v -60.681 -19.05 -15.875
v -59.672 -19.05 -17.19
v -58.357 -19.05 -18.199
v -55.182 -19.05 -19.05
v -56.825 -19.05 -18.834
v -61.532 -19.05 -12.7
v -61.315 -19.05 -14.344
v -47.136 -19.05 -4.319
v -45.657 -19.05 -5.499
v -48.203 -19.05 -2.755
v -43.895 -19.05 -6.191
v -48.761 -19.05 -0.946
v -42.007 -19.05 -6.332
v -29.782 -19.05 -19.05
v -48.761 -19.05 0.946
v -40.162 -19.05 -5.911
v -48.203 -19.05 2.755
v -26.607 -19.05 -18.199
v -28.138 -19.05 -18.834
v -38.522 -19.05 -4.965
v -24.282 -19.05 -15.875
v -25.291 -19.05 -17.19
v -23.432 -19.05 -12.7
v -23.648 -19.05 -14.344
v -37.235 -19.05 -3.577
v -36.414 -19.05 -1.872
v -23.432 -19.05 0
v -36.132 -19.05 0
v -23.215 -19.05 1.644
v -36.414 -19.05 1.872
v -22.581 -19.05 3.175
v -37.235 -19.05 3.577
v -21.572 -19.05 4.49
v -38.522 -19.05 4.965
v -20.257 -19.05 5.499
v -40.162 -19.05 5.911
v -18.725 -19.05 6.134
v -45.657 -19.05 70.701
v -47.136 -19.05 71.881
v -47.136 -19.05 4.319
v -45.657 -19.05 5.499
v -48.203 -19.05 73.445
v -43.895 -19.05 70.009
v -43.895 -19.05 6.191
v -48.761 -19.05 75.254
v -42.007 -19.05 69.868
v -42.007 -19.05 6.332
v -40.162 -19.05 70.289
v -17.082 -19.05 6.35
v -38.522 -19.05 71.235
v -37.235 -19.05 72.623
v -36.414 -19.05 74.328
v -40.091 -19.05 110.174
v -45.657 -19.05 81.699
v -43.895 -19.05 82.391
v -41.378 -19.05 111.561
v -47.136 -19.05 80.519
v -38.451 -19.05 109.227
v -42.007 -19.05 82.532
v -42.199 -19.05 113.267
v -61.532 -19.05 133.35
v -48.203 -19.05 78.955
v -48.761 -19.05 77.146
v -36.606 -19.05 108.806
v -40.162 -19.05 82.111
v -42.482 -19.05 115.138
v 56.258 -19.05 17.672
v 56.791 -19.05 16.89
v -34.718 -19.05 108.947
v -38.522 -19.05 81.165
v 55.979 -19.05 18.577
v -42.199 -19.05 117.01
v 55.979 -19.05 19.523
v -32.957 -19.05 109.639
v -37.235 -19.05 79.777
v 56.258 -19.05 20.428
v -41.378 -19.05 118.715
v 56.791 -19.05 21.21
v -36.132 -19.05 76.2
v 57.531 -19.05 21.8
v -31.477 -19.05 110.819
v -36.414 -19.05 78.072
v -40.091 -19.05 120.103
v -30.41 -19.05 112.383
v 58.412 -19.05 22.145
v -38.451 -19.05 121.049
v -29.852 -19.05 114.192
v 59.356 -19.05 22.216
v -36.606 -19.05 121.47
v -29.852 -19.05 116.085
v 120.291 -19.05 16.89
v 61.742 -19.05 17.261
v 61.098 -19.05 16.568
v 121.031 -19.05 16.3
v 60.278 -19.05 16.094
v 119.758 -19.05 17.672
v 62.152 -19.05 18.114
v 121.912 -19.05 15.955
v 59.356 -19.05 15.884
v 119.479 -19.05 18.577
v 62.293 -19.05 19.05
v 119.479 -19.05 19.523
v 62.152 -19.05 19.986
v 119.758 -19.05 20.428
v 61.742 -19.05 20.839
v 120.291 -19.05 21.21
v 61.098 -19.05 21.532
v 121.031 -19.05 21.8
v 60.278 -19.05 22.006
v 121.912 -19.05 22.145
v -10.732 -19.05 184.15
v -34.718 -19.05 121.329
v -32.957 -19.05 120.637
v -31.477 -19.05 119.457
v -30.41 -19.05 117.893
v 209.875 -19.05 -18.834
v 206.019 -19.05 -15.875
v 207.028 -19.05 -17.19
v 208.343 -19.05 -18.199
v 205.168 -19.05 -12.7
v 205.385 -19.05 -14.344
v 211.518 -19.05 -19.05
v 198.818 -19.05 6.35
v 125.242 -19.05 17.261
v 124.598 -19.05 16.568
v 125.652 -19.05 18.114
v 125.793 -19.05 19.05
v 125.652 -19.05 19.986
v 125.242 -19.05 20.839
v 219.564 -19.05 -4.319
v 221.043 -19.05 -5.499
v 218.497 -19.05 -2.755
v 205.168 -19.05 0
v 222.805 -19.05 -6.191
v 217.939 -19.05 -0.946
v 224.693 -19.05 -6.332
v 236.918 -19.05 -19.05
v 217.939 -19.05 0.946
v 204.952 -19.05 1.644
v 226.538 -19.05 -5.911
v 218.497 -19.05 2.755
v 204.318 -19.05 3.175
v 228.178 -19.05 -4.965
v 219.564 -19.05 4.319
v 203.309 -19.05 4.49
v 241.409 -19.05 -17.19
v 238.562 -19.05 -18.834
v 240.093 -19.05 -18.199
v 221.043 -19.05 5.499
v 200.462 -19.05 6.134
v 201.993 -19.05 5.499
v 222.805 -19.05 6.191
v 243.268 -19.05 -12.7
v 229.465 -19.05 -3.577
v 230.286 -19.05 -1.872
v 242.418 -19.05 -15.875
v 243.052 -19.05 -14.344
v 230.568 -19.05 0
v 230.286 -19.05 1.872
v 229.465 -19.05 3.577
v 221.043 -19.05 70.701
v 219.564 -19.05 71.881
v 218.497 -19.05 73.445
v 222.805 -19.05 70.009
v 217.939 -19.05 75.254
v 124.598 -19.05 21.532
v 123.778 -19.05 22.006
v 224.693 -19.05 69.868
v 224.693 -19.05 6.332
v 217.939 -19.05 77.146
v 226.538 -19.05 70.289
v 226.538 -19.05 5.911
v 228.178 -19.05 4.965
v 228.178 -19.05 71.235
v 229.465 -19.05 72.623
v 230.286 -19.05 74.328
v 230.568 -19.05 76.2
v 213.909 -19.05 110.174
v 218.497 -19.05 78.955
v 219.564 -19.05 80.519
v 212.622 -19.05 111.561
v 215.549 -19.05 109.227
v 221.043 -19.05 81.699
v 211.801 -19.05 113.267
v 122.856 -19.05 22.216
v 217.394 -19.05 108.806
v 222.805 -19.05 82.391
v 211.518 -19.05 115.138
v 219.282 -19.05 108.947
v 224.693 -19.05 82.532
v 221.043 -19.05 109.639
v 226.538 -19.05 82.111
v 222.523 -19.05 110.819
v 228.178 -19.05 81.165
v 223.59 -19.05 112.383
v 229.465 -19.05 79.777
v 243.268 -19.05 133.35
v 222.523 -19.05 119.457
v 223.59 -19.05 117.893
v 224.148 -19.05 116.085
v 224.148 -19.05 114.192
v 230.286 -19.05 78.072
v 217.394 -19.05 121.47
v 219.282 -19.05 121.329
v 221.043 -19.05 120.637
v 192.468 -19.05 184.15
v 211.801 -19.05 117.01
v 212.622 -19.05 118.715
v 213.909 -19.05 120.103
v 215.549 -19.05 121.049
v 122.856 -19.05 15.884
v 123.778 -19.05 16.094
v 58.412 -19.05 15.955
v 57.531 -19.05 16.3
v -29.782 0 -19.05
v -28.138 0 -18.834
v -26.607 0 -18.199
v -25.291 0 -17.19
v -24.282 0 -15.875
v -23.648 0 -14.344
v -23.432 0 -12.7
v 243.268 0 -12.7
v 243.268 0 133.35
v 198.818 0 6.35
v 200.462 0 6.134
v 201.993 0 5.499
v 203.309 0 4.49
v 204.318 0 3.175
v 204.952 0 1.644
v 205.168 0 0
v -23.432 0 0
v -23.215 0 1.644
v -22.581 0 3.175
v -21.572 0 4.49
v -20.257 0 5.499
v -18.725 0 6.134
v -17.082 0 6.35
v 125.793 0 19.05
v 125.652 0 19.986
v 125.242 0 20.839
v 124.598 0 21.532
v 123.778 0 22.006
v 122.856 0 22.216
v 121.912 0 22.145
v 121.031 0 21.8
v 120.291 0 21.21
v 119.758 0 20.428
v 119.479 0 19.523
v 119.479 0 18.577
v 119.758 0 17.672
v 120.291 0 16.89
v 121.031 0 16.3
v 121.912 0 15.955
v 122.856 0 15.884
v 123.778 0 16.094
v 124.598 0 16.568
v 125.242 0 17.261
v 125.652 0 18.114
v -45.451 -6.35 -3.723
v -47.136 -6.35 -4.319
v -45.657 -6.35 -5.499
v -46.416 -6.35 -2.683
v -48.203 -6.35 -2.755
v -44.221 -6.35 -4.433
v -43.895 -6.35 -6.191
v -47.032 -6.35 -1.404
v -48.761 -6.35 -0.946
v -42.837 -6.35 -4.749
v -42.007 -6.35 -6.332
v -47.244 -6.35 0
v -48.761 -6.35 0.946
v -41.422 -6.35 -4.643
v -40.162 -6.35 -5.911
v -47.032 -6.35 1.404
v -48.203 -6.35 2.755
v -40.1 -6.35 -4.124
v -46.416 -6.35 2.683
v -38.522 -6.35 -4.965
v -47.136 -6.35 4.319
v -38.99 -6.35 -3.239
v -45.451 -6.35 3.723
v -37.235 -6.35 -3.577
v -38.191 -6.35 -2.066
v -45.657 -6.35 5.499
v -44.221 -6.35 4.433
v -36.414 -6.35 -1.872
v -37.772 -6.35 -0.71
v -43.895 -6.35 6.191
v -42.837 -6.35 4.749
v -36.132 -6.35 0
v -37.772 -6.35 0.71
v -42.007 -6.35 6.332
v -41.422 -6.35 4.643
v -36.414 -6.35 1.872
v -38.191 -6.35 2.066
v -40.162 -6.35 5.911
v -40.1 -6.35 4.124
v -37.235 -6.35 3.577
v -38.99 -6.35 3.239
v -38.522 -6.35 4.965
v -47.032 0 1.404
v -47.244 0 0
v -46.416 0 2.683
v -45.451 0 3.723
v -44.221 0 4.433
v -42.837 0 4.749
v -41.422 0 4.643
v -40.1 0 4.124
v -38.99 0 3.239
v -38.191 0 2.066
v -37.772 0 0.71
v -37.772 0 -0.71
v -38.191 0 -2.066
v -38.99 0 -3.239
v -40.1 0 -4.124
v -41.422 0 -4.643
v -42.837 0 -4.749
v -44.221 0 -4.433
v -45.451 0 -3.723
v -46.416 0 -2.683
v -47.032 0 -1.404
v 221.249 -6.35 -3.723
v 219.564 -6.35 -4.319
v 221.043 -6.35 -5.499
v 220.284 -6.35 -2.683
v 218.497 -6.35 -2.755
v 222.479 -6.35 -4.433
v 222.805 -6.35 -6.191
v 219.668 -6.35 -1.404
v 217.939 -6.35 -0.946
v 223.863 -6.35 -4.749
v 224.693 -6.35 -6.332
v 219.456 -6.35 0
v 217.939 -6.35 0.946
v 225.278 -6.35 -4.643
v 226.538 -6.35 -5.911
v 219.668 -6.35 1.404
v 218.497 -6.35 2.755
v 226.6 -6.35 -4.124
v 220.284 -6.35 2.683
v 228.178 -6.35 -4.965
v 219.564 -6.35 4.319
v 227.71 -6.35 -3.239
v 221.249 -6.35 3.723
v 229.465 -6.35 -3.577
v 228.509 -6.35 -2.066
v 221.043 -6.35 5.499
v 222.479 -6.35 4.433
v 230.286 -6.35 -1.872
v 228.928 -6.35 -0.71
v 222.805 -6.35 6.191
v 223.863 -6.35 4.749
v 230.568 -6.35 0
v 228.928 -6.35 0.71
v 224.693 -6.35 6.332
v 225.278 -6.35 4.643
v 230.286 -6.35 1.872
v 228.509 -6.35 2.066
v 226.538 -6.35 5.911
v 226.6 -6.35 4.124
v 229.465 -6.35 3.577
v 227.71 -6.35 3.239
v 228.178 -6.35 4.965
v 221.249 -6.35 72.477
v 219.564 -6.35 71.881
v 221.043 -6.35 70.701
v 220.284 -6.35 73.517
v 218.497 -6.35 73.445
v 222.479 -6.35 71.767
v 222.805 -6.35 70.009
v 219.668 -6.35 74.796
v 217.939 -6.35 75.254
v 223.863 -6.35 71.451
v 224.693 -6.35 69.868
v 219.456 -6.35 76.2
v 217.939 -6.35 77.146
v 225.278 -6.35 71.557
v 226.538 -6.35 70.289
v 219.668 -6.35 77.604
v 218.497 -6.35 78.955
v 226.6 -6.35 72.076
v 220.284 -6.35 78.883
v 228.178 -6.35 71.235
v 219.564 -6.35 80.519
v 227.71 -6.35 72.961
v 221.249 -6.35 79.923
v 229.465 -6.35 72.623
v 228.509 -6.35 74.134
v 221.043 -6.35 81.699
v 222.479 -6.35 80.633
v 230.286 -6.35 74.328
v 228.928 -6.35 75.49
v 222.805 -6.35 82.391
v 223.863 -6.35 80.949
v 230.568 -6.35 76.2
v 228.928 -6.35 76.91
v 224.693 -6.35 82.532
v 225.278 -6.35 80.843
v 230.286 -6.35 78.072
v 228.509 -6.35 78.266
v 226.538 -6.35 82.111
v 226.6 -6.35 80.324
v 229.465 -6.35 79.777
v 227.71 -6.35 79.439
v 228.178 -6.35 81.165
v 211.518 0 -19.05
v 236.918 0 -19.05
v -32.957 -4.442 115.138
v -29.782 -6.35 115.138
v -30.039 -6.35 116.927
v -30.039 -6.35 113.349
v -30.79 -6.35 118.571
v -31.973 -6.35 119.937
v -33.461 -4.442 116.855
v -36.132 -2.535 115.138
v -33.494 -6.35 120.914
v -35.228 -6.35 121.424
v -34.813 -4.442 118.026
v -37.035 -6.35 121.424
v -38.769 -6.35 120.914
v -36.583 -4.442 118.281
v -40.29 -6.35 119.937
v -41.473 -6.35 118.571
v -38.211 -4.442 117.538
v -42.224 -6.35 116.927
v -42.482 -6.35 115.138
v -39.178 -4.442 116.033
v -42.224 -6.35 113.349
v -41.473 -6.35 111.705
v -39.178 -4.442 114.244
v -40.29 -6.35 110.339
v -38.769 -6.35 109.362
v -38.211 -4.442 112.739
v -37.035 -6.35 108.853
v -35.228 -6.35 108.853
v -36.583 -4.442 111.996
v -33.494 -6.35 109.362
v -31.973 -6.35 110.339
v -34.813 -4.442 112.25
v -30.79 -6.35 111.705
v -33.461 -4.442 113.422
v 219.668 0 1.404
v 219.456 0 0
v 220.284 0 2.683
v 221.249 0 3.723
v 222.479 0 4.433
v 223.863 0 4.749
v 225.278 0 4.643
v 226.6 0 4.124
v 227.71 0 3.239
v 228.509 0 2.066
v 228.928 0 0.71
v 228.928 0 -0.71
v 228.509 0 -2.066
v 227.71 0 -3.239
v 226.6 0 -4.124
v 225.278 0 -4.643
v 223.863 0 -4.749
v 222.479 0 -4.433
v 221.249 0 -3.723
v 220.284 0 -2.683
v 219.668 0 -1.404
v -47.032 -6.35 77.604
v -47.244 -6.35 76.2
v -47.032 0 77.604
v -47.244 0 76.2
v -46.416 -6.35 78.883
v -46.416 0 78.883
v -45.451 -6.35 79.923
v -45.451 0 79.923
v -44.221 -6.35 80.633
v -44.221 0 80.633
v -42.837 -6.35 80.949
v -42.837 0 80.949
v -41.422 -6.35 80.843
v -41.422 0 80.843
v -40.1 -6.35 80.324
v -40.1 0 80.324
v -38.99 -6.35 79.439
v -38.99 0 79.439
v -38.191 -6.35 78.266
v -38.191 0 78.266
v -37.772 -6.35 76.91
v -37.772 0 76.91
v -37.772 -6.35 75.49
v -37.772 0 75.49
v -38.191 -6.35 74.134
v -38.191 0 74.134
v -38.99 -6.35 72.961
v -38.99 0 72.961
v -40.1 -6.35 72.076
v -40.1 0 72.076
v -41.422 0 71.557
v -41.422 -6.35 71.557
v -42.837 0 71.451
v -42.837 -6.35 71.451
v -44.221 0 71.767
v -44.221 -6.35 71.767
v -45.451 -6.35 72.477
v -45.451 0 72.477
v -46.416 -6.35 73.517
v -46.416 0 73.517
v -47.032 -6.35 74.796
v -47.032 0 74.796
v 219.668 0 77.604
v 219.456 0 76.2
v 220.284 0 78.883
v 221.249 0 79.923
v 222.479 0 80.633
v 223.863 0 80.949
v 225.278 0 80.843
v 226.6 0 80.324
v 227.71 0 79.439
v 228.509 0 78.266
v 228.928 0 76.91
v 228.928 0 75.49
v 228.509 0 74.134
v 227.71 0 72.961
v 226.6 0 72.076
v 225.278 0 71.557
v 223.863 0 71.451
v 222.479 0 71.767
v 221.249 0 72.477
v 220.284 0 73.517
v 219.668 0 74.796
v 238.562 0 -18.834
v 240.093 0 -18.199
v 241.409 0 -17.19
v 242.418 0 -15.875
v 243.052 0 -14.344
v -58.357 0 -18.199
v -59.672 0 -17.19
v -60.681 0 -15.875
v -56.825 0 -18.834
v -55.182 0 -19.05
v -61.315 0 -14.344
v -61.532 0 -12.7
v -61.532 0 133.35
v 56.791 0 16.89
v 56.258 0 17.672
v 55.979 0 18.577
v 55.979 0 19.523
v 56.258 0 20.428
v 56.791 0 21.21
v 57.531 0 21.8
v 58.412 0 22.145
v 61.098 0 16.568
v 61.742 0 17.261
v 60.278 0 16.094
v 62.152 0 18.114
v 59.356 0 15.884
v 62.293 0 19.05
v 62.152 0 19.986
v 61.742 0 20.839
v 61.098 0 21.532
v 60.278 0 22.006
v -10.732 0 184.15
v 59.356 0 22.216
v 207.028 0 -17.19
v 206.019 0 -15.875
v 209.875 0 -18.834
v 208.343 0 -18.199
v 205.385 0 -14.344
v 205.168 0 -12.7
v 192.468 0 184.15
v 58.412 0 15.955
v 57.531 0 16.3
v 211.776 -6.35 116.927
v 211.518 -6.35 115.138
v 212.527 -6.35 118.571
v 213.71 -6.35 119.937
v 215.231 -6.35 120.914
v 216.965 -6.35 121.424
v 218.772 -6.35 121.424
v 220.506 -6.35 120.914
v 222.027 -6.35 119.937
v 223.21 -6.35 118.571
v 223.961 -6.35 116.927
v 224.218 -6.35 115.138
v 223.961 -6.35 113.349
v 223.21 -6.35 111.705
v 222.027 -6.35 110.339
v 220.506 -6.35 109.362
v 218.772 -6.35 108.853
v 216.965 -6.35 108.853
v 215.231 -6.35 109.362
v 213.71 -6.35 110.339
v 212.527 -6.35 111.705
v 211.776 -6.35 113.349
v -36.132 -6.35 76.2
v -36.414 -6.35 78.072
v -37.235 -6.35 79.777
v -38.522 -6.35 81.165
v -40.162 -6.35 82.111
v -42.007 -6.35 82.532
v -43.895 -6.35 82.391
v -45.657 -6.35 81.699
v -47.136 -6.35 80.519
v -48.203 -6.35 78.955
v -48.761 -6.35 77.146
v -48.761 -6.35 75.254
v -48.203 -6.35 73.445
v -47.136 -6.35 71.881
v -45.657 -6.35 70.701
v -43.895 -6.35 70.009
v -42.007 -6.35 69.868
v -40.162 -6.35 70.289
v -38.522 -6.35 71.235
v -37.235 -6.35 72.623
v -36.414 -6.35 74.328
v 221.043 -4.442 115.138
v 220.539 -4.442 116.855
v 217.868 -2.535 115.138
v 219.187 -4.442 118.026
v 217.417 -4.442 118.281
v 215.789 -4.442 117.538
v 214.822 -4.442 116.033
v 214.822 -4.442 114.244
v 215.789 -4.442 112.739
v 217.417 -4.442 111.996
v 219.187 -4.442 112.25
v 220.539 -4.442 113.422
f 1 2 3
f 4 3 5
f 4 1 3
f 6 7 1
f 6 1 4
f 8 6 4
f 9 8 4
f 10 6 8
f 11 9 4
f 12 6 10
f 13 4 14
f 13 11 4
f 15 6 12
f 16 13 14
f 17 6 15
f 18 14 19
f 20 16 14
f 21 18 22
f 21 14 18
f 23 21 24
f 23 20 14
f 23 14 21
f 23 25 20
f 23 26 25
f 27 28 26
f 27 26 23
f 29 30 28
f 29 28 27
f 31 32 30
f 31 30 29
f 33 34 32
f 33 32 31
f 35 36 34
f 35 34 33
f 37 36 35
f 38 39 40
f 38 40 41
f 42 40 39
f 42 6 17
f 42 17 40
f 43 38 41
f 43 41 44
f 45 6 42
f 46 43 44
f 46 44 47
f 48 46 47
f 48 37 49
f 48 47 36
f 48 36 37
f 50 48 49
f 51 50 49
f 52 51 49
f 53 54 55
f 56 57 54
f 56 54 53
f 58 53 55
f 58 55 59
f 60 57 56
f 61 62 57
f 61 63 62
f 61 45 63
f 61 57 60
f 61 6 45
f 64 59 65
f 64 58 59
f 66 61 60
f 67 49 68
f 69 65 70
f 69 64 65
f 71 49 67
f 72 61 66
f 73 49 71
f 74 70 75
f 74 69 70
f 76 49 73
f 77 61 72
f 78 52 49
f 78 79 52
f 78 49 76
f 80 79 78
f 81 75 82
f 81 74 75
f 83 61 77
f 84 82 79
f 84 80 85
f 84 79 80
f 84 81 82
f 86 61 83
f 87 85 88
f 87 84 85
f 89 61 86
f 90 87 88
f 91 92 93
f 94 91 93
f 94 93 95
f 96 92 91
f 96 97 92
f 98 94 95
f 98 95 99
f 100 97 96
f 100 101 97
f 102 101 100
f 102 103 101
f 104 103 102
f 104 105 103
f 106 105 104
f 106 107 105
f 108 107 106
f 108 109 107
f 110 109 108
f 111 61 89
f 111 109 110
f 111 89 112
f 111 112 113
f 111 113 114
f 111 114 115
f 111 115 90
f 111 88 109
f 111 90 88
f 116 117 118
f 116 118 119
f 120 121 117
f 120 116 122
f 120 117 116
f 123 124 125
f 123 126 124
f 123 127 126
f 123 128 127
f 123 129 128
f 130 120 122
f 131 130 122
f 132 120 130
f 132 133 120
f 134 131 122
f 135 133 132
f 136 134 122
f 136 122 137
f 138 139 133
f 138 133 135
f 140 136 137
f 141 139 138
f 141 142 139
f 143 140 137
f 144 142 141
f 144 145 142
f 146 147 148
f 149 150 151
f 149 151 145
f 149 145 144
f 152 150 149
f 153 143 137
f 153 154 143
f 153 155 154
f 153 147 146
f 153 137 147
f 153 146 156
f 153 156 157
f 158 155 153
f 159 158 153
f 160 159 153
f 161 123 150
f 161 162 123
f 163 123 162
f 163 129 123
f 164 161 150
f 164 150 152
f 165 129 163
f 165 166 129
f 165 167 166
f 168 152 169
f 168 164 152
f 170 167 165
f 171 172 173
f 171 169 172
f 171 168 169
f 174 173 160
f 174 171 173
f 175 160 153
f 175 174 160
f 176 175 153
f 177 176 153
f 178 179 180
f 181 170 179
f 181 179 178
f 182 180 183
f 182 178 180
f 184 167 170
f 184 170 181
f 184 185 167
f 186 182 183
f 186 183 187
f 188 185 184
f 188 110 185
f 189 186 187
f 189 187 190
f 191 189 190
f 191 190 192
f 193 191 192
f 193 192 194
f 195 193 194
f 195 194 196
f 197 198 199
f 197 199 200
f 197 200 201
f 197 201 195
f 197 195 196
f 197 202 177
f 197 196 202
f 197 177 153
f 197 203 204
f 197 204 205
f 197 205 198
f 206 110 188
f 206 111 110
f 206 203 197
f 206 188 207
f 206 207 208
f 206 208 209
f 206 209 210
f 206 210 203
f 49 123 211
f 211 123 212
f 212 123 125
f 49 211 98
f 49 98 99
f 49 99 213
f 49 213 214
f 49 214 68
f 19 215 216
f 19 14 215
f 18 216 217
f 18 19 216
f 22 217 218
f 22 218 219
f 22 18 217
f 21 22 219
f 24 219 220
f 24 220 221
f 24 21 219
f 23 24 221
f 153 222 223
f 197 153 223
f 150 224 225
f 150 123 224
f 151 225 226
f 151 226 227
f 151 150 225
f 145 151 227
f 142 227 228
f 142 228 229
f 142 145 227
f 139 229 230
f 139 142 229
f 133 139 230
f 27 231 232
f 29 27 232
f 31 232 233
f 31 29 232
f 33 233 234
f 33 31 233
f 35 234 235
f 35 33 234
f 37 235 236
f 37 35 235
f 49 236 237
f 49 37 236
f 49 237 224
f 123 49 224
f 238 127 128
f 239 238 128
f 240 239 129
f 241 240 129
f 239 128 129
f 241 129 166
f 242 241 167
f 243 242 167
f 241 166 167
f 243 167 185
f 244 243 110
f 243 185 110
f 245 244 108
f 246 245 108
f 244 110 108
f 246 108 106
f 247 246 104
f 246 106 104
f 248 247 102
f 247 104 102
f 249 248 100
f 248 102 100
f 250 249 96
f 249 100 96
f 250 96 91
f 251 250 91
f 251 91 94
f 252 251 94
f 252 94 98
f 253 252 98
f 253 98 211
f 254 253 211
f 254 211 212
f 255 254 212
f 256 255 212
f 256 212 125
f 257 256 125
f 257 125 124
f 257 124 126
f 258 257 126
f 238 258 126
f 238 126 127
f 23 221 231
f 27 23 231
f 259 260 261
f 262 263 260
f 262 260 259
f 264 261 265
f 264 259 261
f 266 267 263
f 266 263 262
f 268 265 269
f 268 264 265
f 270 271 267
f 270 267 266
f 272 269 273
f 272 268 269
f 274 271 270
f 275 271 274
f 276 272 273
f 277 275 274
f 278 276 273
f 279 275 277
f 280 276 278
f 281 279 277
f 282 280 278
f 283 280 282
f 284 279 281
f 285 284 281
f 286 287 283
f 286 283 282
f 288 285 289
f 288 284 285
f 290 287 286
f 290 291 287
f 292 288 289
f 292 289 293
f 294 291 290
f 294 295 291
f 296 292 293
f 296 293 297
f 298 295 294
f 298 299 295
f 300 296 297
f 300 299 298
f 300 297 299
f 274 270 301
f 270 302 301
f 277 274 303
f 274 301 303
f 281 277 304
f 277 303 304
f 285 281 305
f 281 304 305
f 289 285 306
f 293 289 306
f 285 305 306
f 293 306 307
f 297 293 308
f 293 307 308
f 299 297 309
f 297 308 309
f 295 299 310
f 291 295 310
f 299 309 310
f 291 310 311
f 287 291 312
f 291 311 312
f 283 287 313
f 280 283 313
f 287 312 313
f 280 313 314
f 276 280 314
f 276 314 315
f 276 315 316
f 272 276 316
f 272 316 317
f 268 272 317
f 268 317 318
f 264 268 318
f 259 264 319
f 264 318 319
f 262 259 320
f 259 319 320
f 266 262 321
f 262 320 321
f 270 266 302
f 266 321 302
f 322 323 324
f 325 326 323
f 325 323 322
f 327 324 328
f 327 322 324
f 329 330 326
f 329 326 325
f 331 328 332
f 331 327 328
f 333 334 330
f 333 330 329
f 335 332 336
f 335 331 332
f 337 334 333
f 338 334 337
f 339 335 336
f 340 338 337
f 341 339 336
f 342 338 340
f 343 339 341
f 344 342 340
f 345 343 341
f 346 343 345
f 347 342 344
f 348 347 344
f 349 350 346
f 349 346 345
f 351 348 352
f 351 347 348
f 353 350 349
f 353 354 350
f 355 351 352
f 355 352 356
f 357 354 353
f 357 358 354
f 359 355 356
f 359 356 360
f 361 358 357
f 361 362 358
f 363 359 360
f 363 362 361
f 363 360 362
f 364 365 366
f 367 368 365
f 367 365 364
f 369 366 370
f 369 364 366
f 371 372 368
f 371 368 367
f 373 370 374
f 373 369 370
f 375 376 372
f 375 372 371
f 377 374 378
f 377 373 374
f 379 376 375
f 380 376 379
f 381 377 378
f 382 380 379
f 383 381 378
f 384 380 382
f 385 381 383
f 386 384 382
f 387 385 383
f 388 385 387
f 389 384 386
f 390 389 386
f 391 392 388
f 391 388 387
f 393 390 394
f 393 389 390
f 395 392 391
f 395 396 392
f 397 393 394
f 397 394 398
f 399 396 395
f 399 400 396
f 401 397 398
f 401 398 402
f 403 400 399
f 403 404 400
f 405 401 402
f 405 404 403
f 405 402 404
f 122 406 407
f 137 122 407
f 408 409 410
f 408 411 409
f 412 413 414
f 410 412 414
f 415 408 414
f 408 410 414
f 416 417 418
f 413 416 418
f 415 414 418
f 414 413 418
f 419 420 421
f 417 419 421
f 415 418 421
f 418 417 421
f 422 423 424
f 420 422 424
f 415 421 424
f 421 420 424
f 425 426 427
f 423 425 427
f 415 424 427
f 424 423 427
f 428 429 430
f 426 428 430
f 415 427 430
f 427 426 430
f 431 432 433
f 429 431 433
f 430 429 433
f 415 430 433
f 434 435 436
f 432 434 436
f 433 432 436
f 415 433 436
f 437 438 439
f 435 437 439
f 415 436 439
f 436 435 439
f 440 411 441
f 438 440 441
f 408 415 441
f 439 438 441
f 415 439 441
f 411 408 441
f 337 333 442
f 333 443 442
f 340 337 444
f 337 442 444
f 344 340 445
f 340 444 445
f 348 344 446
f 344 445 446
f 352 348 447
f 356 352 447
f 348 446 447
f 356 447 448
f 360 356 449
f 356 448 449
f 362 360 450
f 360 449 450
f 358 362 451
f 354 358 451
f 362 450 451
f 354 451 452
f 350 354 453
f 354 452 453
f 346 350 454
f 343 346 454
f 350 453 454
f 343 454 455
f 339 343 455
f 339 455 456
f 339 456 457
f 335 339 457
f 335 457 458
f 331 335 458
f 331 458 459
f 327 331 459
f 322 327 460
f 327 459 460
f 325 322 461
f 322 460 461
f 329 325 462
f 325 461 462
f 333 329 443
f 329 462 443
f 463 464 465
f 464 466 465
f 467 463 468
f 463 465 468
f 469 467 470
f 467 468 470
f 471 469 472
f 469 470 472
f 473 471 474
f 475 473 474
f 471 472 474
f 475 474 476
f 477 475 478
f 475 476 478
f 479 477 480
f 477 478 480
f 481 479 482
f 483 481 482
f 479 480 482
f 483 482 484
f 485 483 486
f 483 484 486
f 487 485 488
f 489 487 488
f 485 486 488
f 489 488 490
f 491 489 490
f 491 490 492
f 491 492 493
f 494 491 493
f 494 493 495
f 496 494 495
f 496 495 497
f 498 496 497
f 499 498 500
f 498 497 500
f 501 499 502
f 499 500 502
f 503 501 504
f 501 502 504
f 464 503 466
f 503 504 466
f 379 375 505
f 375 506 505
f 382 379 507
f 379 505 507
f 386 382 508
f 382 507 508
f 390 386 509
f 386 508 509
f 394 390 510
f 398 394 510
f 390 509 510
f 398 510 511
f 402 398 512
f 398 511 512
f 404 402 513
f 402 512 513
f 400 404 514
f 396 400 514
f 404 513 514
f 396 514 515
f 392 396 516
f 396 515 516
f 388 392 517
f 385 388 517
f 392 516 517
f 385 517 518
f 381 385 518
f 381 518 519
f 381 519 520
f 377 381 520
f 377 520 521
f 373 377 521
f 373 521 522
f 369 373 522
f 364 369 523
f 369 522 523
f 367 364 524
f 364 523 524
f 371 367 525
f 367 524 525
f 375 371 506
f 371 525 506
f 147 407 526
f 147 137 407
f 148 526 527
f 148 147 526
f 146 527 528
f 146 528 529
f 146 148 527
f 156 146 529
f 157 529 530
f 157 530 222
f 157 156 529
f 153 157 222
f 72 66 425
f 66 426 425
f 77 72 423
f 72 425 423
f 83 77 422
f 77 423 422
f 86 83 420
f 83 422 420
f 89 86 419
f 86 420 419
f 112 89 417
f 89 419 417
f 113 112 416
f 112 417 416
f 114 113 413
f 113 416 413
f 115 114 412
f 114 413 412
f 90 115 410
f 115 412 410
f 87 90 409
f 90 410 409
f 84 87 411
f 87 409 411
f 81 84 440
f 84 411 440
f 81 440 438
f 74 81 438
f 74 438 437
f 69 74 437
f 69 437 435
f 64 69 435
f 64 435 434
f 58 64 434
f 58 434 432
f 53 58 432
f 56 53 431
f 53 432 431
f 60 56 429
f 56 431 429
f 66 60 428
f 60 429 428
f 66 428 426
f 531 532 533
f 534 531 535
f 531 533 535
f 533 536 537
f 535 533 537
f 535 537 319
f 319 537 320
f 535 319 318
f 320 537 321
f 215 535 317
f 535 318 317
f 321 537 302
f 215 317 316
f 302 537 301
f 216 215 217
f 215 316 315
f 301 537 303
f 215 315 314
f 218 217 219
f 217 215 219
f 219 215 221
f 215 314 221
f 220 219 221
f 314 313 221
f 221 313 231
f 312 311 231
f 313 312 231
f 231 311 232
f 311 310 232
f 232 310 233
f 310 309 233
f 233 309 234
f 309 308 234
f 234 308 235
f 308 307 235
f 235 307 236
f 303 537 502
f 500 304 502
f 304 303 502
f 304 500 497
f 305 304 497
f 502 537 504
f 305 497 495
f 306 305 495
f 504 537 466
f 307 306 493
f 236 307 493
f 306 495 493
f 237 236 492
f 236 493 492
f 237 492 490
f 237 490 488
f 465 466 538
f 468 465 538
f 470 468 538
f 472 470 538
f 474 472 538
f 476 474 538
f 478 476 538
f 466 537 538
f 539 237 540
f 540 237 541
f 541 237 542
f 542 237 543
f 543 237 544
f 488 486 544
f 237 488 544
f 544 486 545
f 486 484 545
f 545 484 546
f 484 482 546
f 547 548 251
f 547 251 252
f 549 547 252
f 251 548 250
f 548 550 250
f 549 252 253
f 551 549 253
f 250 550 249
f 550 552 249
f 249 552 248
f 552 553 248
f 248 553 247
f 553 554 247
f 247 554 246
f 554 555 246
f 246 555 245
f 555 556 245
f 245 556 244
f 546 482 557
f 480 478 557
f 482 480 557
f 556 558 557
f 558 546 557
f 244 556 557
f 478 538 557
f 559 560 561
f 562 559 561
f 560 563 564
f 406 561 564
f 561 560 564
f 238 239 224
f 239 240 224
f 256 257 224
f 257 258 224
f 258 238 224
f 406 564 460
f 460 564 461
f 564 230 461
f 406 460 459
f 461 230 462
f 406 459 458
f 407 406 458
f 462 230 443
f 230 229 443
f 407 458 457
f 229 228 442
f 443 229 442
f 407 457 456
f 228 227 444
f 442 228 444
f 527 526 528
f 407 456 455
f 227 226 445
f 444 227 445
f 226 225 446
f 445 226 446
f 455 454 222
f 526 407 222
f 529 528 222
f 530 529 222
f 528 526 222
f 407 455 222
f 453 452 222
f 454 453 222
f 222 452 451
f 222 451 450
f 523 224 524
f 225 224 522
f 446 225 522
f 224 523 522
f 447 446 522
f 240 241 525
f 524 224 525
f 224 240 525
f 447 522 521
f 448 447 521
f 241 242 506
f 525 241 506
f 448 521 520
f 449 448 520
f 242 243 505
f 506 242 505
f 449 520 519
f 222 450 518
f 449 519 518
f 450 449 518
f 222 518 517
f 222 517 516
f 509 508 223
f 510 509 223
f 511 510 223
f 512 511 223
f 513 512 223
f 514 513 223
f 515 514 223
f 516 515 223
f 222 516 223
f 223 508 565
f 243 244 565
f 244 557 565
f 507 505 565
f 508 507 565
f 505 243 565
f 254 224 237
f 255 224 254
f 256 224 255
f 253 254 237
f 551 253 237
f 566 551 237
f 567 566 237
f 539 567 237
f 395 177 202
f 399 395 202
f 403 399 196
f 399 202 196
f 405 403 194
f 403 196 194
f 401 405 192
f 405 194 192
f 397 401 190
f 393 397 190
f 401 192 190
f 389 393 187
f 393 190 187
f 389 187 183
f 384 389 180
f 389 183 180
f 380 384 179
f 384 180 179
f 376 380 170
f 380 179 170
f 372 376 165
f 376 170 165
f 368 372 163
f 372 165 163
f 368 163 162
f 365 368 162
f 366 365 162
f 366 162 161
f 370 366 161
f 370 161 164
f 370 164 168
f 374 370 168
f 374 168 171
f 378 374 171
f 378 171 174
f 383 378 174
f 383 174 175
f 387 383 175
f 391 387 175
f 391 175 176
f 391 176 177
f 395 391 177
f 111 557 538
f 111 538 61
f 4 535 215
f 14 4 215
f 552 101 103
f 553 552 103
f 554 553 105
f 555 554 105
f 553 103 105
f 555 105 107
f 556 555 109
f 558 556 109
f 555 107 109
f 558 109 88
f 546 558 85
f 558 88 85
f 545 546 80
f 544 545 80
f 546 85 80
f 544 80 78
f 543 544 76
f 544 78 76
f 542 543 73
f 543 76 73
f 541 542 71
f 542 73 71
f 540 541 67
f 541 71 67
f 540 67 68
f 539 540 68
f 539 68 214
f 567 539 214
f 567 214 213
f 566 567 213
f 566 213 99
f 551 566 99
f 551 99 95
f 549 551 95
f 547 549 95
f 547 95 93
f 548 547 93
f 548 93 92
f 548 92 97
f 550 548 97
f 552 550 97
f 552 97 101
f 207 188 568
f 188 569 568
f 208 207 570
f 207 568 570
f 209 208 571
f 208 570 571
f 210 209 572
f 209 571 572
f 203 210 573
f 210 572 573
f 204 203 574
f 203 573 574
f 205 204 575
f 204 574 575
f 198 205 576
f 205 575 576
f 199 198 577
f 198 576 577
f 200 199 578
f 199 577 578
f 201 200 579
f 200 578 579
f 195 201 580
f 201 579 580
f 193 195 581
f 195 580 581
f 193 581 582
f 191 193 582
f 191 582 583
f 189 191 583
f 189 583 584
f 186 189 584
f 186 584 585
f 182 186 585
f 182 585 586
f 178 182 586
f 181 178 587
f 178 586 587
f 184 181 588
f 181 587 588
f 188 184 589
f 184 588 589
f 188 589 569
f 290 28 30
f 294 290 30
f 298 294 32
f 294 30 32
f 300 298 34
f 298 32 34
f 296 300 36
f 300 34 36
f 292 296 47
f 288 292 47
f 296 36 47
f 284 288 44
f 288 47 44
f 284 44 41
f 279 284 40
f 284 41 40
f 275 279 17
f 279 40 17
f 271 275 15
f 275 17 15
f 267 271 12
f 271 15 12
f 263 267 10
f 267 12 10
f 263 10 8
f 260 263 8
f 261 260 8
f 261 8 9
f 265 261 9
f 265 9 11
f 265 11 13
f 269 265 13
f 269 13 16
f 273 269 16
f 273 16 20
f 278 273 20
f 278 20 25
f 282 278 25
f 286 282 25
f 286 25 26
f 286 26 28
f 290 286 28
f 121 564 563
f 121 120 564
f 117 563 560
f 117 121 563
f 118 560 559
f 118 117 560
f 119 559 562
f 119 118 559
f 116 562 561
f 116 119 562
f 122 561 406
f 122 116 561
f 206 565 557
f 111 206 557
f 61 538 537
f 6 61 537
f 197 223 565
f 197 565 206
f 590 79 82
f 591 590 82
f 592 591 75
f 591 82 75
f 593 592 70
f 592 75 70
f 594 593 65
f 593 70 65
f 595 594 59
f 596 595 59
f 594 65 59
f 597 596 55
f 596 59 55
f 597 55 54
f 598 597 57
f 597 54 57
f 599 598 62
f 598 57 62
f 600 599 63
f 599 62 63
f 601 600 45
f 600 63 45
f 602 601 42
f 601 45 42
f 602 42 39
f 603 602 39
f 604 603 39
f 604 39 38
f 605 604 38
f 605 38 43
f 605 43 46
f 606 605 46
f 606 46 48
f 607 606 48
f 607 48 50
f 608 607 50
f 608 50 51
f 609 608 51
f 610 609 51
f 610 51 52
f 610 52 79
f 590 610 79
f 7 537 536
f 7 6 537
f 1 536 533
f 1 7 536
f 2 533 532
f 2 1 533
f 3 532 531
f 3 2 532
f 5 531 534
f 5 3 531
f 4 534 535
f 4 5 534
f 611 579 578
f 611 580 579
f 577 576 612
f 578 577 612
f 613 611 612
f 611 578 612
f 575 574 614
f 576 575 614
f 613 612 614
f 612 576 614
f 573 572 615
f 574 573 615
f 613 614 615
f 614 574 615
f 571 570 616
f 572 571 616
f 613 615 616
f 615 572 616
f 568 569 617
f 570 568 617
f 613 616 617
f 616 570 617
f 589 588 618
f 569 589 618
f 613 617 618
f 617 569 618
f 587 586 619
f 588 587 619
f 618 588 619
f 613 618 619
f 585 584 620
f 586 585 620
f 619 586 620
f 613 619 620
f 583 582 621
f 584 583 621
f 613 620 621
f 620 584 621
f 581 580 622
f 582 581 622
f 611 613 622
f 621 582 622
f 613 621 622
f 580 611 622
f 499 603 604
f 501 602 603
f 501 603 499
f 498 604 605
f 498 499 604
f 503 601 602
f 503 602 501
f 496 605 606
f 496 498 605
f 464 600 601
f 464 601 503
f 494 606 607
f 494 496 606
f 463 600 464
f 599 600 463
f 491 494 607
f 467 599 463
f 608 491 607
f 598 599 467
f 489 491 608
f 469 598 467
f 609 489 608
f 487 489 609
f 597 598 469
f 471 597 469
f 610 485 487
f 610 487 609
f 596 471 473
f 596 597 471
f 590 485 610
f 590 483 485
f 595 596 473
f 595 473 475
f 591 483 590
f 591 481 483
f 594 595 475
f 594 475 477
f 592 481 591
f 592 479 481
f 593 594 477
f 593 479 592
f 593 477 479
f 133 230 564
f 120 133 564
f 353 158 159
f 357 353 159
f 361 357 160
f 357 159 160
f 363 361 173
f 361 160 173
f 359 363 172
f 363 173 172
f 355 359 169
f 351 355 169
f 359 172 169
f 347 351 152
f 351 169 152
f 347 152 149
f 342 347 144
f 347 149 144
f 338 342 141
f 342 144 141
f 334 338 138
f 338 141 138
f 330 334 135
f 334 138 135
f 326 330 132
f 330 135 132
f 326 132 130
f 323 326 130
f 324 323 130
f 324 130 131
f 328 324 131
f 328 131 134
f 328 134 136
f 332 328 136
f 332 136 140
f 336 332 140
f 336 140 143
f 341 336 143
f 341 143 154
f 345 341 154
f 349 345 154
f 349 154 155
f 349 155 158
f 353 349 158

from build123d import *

# Parameters (mm, degrees)
F1_DEPTH       = 19.05
F2_R           = 6.35
F3_SIZE2       = 50.8
F3_SIZE        = 50.8
F4_R           = 3.175
F5_DEPTH       = 25.4
F6_D           = 12.7
F6_DEPTH       = 12.7
F6_TIP         = 3.8154649308
F7_D           = 9.525
F7_DEPTH       = 25.4
F7_CBORE_D     = 12.7
F7_CBORE_DEPTH = 12.7
F7_TIP         = 2.8615986981


# Not quite as in the source:
# - a feature names something its author has since deleted; it is built from what else it names


with BuildPart() as f1:
    # F0 (on Front) → F1 (new body)
    with BuildSketch(Plane.XZ):
        Polygon((-61.5315027535, 184.1499997646), (-61.5315027535, -19.0500002354), (-23.4315027535, -19.0500002354), (-23.4315027535, 6.3499997646), (205.1684972465, 6.3499997646), (205.1684972465, -19.0500002354), (243.2684972465, -19.0500002354), (243.2684972465, 184.1499997646), align=None)
    extrude(amount=F1_DEPTH)

    # F2
    f2_edges = [f1.edges().sort_by_distance(p)[0] for p in [
        (-23.431503, -9.525, 6.35),
        (-61.531503, -9.525, -19.05),
        (243.268497, -9.525, -19.05),
        (205.168497, -9.525, -19.05),
        (205.168497, -9.525, 6.35),
        (-23.431503, -9.525, -19.05),
    ]]
    fillet(f2_edges, radius=F2_R)

    # F3
    f3_edges = [f1.edges().sort_by_distance(p)[0] for p in [
        (243.268497, -9.525, 184.15),
        (-61.531503, -9.525, 184.15),
    ]]
    chamfer(f3_edges, length=F3_SIZE, length2=F3_SIZE2)

    # F4 (on face) → F5 (cut)
    with BuildSketch(Plane.XZ.offset(19.05)):
        with Locations((59.1184972465, 19.0499997646)):
            Circle(F4_R)
        with Locations((122.6184972465, 19.0499997646)):
            Circle(F4_R)
    extrude(amount=-F5_DEPTH, mode=Mode.SUBTRACT)

    # F6
    with Locations(Plane.XZ.offset(19.05)):
        with Locations((-36.1315027535, 115.1381997646), (217.8684972465, 115.1381997646)):
            Hole(F6_D / 2, depth=F6_DEPTH)
            with Locations((0, 0, -(F6_DEPTH + F6_TIP / 2))):  # 118° drill point
                Cone(0, F6_D / 2, F6_TIP, mode=Mode.SUBTRACT)

    # F7
    with Locations(Plane.XZ.offset(19.05)):
        with Locations((-42.4815027535, 76.1999997646), (-42.4815027535, -2.354e-07), (224.2184972465, -2.354e-07), (224.2184972465, 76.1999997646)):
            CounterBoreHole(F7_D / 2, F7_CBORE_D / 2, F7_CBORE_DEPTH, depth=F7_DEPTH)
            with Locations((0, 0, -(F7_DEPTH + F7_TIP / 2))):  # 118° drill point
                Cone(0, F7_D / 2, F7_TIP, mode=Mode.SUBTRACT)


solid = f1.part
